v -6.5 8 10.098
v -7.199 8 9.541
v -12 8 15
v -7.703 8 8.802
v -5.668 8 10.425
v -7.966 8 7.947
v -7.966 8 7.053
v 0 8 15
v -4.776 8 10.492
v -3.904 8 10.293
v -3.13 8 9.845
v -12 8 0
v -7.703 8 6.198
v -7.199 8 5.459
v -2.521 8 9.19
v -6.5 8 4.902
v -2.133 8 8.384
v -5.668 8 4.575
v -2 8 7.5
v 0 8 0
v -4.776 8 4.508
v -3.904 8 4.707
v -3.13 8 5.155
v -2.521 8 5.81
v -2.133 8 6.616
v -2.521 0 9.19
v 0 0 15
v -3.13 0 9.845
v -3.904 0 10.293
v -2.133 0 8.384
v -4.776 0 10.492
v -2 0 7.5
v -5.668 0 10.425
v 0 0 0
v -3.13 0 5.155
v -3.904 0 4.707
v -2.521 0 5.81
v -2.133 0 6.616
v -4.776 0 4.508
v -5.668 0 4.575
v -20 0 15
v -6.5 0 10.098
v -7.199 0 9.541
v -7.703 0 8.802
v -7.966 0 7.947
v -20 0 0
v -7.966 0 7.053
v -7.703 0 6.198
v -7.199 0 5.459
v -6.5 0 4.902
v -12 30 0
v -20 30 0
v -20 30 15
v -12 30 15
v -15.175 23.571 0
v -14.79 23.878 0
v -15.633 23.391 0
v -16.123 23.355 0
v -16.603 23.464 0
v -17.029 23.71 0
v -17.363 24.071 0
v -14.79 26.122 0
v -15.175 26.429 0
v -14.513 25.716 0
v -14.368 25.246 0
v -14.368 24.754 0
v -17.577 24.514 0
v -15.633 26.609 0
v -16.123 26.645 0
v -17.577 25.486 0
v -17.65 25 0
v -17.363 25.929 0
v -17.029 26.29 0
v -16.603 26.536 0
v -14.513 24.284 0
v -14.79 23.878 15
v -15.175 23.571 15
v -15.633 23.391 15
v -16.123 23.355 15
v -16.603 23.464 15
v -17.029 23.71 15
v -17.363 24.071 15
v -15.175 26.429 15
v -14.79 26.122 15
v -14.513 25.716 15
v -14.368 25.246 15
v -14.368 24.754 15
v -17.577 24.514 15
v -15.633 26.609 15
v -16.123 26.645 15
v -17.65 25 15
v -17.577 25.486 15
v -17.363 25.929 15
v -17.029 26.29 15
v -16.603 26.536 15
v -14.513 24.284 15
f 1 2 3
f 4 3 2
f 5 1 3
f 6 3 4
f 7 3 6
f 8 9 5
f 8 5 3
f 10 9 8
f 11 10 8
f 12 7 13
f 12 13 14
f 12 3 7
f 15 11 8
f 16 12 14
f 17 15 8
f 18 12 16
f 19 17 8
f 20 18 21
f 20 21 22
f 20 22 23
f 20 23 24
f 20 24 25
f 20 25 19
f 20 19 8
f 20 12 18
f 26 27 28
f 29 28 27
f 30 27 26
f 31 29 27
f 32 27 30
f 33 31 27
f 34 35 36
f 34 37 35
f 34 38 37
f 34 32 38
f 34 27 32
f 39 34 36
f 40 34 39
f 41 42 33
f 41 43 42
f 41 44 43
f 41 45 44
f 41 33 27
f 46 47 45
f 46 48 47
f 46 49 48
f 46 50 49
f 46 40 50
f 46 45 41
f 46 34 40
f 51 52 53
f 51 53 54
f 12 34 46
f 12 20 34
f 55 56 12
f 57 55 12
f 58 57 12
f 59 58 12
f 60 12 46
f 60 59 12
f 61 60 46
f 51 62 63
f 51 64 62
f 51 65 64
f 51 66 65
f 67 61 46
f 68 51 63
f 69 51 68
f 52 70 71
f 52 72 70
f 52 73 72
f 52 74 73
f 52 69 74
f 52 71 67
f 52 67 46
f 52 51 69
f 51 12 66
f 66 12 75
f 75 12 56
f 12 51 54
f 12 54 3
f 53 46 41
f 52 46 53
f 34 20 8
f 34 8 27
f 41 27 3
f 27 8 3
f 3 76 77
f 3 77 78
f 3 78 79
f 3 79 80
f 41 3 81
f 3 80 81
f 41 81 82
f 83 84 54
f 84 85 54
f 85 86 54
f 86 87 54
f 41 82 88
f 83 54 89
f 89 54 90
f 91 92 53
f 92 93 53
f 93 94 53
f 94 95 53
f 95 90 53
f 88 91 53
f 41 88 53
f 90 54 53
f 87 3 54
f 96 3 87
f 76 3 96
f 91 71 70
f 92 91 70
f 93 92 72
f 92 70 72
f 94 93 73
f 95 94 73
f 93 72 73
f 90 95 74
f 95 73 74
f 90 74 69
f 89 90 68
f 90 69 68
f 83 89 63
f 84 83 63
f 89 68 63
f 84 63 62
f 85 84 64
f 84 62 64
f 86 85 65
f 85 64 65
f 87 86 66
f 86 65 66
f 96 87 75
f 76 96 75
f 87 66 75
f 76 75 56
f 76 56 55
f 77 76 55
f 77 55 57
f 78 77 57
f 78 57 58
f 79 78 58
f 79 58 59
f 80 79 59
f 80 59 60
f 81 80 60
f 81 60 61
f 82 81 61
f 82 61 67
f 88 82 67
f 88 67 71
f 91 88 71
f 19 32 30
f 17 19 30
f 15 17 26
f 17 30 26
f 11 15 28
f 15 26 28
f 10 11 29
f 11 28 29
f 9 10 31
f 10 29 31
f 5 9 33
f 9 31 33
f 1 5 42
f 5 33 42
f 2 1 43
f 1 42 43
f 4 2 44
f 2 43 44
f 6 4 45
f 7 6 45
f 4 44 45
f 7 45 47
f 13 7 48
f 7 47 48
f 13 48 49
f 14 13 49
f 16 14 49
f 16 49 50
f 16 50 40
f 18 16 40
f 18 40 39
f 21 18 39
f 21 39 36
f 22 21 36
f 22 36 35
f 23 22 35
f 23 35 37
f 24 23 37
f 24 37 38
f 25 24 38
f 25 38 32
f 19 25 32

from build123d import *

# Parameters (mm, degrees)
ESTRUSIONE_ESTRUSIONE1_DEPTH = 15
SCHIZZO2_R                   = 3
TAGLIO_ESTRUSIONE1_DEPTH     = 15
FORO_FILETTATO_M4_1_D        = 3.3


with BuildPart() as part:
    # Schizzo1 → Estrusione-Estrusione1 (new body)
    with BuildSketch(Plane.XY):
        Polygon((0, 0), (-20, 0), (-20, 30), (-12, 30), (-12, 8), (0, 8), align=None)
    extrude(amount=ESTRUSIONE_ESTRUSIONE1_DEPTH)

    # Schizzo2 → Taglio-Estrusione1 (cut)
    with BuildSketch(Plane.XZ):
        with Locations((-5, 7.5)):
            Circle(SCHIZZO2_R)
    extrude(amount=-TAGLIO_ESTRUSIONE1_DEPTH, mode=Mode.SUBTRACT)

    # Foro filettato M4-1 (through all)
    with Locations(Plane.XY.offset(15)):
        with Locations((-16, 25)):
            Hole(FORO_FILETTATO_M4_1_D / 2)


solid = part.part
